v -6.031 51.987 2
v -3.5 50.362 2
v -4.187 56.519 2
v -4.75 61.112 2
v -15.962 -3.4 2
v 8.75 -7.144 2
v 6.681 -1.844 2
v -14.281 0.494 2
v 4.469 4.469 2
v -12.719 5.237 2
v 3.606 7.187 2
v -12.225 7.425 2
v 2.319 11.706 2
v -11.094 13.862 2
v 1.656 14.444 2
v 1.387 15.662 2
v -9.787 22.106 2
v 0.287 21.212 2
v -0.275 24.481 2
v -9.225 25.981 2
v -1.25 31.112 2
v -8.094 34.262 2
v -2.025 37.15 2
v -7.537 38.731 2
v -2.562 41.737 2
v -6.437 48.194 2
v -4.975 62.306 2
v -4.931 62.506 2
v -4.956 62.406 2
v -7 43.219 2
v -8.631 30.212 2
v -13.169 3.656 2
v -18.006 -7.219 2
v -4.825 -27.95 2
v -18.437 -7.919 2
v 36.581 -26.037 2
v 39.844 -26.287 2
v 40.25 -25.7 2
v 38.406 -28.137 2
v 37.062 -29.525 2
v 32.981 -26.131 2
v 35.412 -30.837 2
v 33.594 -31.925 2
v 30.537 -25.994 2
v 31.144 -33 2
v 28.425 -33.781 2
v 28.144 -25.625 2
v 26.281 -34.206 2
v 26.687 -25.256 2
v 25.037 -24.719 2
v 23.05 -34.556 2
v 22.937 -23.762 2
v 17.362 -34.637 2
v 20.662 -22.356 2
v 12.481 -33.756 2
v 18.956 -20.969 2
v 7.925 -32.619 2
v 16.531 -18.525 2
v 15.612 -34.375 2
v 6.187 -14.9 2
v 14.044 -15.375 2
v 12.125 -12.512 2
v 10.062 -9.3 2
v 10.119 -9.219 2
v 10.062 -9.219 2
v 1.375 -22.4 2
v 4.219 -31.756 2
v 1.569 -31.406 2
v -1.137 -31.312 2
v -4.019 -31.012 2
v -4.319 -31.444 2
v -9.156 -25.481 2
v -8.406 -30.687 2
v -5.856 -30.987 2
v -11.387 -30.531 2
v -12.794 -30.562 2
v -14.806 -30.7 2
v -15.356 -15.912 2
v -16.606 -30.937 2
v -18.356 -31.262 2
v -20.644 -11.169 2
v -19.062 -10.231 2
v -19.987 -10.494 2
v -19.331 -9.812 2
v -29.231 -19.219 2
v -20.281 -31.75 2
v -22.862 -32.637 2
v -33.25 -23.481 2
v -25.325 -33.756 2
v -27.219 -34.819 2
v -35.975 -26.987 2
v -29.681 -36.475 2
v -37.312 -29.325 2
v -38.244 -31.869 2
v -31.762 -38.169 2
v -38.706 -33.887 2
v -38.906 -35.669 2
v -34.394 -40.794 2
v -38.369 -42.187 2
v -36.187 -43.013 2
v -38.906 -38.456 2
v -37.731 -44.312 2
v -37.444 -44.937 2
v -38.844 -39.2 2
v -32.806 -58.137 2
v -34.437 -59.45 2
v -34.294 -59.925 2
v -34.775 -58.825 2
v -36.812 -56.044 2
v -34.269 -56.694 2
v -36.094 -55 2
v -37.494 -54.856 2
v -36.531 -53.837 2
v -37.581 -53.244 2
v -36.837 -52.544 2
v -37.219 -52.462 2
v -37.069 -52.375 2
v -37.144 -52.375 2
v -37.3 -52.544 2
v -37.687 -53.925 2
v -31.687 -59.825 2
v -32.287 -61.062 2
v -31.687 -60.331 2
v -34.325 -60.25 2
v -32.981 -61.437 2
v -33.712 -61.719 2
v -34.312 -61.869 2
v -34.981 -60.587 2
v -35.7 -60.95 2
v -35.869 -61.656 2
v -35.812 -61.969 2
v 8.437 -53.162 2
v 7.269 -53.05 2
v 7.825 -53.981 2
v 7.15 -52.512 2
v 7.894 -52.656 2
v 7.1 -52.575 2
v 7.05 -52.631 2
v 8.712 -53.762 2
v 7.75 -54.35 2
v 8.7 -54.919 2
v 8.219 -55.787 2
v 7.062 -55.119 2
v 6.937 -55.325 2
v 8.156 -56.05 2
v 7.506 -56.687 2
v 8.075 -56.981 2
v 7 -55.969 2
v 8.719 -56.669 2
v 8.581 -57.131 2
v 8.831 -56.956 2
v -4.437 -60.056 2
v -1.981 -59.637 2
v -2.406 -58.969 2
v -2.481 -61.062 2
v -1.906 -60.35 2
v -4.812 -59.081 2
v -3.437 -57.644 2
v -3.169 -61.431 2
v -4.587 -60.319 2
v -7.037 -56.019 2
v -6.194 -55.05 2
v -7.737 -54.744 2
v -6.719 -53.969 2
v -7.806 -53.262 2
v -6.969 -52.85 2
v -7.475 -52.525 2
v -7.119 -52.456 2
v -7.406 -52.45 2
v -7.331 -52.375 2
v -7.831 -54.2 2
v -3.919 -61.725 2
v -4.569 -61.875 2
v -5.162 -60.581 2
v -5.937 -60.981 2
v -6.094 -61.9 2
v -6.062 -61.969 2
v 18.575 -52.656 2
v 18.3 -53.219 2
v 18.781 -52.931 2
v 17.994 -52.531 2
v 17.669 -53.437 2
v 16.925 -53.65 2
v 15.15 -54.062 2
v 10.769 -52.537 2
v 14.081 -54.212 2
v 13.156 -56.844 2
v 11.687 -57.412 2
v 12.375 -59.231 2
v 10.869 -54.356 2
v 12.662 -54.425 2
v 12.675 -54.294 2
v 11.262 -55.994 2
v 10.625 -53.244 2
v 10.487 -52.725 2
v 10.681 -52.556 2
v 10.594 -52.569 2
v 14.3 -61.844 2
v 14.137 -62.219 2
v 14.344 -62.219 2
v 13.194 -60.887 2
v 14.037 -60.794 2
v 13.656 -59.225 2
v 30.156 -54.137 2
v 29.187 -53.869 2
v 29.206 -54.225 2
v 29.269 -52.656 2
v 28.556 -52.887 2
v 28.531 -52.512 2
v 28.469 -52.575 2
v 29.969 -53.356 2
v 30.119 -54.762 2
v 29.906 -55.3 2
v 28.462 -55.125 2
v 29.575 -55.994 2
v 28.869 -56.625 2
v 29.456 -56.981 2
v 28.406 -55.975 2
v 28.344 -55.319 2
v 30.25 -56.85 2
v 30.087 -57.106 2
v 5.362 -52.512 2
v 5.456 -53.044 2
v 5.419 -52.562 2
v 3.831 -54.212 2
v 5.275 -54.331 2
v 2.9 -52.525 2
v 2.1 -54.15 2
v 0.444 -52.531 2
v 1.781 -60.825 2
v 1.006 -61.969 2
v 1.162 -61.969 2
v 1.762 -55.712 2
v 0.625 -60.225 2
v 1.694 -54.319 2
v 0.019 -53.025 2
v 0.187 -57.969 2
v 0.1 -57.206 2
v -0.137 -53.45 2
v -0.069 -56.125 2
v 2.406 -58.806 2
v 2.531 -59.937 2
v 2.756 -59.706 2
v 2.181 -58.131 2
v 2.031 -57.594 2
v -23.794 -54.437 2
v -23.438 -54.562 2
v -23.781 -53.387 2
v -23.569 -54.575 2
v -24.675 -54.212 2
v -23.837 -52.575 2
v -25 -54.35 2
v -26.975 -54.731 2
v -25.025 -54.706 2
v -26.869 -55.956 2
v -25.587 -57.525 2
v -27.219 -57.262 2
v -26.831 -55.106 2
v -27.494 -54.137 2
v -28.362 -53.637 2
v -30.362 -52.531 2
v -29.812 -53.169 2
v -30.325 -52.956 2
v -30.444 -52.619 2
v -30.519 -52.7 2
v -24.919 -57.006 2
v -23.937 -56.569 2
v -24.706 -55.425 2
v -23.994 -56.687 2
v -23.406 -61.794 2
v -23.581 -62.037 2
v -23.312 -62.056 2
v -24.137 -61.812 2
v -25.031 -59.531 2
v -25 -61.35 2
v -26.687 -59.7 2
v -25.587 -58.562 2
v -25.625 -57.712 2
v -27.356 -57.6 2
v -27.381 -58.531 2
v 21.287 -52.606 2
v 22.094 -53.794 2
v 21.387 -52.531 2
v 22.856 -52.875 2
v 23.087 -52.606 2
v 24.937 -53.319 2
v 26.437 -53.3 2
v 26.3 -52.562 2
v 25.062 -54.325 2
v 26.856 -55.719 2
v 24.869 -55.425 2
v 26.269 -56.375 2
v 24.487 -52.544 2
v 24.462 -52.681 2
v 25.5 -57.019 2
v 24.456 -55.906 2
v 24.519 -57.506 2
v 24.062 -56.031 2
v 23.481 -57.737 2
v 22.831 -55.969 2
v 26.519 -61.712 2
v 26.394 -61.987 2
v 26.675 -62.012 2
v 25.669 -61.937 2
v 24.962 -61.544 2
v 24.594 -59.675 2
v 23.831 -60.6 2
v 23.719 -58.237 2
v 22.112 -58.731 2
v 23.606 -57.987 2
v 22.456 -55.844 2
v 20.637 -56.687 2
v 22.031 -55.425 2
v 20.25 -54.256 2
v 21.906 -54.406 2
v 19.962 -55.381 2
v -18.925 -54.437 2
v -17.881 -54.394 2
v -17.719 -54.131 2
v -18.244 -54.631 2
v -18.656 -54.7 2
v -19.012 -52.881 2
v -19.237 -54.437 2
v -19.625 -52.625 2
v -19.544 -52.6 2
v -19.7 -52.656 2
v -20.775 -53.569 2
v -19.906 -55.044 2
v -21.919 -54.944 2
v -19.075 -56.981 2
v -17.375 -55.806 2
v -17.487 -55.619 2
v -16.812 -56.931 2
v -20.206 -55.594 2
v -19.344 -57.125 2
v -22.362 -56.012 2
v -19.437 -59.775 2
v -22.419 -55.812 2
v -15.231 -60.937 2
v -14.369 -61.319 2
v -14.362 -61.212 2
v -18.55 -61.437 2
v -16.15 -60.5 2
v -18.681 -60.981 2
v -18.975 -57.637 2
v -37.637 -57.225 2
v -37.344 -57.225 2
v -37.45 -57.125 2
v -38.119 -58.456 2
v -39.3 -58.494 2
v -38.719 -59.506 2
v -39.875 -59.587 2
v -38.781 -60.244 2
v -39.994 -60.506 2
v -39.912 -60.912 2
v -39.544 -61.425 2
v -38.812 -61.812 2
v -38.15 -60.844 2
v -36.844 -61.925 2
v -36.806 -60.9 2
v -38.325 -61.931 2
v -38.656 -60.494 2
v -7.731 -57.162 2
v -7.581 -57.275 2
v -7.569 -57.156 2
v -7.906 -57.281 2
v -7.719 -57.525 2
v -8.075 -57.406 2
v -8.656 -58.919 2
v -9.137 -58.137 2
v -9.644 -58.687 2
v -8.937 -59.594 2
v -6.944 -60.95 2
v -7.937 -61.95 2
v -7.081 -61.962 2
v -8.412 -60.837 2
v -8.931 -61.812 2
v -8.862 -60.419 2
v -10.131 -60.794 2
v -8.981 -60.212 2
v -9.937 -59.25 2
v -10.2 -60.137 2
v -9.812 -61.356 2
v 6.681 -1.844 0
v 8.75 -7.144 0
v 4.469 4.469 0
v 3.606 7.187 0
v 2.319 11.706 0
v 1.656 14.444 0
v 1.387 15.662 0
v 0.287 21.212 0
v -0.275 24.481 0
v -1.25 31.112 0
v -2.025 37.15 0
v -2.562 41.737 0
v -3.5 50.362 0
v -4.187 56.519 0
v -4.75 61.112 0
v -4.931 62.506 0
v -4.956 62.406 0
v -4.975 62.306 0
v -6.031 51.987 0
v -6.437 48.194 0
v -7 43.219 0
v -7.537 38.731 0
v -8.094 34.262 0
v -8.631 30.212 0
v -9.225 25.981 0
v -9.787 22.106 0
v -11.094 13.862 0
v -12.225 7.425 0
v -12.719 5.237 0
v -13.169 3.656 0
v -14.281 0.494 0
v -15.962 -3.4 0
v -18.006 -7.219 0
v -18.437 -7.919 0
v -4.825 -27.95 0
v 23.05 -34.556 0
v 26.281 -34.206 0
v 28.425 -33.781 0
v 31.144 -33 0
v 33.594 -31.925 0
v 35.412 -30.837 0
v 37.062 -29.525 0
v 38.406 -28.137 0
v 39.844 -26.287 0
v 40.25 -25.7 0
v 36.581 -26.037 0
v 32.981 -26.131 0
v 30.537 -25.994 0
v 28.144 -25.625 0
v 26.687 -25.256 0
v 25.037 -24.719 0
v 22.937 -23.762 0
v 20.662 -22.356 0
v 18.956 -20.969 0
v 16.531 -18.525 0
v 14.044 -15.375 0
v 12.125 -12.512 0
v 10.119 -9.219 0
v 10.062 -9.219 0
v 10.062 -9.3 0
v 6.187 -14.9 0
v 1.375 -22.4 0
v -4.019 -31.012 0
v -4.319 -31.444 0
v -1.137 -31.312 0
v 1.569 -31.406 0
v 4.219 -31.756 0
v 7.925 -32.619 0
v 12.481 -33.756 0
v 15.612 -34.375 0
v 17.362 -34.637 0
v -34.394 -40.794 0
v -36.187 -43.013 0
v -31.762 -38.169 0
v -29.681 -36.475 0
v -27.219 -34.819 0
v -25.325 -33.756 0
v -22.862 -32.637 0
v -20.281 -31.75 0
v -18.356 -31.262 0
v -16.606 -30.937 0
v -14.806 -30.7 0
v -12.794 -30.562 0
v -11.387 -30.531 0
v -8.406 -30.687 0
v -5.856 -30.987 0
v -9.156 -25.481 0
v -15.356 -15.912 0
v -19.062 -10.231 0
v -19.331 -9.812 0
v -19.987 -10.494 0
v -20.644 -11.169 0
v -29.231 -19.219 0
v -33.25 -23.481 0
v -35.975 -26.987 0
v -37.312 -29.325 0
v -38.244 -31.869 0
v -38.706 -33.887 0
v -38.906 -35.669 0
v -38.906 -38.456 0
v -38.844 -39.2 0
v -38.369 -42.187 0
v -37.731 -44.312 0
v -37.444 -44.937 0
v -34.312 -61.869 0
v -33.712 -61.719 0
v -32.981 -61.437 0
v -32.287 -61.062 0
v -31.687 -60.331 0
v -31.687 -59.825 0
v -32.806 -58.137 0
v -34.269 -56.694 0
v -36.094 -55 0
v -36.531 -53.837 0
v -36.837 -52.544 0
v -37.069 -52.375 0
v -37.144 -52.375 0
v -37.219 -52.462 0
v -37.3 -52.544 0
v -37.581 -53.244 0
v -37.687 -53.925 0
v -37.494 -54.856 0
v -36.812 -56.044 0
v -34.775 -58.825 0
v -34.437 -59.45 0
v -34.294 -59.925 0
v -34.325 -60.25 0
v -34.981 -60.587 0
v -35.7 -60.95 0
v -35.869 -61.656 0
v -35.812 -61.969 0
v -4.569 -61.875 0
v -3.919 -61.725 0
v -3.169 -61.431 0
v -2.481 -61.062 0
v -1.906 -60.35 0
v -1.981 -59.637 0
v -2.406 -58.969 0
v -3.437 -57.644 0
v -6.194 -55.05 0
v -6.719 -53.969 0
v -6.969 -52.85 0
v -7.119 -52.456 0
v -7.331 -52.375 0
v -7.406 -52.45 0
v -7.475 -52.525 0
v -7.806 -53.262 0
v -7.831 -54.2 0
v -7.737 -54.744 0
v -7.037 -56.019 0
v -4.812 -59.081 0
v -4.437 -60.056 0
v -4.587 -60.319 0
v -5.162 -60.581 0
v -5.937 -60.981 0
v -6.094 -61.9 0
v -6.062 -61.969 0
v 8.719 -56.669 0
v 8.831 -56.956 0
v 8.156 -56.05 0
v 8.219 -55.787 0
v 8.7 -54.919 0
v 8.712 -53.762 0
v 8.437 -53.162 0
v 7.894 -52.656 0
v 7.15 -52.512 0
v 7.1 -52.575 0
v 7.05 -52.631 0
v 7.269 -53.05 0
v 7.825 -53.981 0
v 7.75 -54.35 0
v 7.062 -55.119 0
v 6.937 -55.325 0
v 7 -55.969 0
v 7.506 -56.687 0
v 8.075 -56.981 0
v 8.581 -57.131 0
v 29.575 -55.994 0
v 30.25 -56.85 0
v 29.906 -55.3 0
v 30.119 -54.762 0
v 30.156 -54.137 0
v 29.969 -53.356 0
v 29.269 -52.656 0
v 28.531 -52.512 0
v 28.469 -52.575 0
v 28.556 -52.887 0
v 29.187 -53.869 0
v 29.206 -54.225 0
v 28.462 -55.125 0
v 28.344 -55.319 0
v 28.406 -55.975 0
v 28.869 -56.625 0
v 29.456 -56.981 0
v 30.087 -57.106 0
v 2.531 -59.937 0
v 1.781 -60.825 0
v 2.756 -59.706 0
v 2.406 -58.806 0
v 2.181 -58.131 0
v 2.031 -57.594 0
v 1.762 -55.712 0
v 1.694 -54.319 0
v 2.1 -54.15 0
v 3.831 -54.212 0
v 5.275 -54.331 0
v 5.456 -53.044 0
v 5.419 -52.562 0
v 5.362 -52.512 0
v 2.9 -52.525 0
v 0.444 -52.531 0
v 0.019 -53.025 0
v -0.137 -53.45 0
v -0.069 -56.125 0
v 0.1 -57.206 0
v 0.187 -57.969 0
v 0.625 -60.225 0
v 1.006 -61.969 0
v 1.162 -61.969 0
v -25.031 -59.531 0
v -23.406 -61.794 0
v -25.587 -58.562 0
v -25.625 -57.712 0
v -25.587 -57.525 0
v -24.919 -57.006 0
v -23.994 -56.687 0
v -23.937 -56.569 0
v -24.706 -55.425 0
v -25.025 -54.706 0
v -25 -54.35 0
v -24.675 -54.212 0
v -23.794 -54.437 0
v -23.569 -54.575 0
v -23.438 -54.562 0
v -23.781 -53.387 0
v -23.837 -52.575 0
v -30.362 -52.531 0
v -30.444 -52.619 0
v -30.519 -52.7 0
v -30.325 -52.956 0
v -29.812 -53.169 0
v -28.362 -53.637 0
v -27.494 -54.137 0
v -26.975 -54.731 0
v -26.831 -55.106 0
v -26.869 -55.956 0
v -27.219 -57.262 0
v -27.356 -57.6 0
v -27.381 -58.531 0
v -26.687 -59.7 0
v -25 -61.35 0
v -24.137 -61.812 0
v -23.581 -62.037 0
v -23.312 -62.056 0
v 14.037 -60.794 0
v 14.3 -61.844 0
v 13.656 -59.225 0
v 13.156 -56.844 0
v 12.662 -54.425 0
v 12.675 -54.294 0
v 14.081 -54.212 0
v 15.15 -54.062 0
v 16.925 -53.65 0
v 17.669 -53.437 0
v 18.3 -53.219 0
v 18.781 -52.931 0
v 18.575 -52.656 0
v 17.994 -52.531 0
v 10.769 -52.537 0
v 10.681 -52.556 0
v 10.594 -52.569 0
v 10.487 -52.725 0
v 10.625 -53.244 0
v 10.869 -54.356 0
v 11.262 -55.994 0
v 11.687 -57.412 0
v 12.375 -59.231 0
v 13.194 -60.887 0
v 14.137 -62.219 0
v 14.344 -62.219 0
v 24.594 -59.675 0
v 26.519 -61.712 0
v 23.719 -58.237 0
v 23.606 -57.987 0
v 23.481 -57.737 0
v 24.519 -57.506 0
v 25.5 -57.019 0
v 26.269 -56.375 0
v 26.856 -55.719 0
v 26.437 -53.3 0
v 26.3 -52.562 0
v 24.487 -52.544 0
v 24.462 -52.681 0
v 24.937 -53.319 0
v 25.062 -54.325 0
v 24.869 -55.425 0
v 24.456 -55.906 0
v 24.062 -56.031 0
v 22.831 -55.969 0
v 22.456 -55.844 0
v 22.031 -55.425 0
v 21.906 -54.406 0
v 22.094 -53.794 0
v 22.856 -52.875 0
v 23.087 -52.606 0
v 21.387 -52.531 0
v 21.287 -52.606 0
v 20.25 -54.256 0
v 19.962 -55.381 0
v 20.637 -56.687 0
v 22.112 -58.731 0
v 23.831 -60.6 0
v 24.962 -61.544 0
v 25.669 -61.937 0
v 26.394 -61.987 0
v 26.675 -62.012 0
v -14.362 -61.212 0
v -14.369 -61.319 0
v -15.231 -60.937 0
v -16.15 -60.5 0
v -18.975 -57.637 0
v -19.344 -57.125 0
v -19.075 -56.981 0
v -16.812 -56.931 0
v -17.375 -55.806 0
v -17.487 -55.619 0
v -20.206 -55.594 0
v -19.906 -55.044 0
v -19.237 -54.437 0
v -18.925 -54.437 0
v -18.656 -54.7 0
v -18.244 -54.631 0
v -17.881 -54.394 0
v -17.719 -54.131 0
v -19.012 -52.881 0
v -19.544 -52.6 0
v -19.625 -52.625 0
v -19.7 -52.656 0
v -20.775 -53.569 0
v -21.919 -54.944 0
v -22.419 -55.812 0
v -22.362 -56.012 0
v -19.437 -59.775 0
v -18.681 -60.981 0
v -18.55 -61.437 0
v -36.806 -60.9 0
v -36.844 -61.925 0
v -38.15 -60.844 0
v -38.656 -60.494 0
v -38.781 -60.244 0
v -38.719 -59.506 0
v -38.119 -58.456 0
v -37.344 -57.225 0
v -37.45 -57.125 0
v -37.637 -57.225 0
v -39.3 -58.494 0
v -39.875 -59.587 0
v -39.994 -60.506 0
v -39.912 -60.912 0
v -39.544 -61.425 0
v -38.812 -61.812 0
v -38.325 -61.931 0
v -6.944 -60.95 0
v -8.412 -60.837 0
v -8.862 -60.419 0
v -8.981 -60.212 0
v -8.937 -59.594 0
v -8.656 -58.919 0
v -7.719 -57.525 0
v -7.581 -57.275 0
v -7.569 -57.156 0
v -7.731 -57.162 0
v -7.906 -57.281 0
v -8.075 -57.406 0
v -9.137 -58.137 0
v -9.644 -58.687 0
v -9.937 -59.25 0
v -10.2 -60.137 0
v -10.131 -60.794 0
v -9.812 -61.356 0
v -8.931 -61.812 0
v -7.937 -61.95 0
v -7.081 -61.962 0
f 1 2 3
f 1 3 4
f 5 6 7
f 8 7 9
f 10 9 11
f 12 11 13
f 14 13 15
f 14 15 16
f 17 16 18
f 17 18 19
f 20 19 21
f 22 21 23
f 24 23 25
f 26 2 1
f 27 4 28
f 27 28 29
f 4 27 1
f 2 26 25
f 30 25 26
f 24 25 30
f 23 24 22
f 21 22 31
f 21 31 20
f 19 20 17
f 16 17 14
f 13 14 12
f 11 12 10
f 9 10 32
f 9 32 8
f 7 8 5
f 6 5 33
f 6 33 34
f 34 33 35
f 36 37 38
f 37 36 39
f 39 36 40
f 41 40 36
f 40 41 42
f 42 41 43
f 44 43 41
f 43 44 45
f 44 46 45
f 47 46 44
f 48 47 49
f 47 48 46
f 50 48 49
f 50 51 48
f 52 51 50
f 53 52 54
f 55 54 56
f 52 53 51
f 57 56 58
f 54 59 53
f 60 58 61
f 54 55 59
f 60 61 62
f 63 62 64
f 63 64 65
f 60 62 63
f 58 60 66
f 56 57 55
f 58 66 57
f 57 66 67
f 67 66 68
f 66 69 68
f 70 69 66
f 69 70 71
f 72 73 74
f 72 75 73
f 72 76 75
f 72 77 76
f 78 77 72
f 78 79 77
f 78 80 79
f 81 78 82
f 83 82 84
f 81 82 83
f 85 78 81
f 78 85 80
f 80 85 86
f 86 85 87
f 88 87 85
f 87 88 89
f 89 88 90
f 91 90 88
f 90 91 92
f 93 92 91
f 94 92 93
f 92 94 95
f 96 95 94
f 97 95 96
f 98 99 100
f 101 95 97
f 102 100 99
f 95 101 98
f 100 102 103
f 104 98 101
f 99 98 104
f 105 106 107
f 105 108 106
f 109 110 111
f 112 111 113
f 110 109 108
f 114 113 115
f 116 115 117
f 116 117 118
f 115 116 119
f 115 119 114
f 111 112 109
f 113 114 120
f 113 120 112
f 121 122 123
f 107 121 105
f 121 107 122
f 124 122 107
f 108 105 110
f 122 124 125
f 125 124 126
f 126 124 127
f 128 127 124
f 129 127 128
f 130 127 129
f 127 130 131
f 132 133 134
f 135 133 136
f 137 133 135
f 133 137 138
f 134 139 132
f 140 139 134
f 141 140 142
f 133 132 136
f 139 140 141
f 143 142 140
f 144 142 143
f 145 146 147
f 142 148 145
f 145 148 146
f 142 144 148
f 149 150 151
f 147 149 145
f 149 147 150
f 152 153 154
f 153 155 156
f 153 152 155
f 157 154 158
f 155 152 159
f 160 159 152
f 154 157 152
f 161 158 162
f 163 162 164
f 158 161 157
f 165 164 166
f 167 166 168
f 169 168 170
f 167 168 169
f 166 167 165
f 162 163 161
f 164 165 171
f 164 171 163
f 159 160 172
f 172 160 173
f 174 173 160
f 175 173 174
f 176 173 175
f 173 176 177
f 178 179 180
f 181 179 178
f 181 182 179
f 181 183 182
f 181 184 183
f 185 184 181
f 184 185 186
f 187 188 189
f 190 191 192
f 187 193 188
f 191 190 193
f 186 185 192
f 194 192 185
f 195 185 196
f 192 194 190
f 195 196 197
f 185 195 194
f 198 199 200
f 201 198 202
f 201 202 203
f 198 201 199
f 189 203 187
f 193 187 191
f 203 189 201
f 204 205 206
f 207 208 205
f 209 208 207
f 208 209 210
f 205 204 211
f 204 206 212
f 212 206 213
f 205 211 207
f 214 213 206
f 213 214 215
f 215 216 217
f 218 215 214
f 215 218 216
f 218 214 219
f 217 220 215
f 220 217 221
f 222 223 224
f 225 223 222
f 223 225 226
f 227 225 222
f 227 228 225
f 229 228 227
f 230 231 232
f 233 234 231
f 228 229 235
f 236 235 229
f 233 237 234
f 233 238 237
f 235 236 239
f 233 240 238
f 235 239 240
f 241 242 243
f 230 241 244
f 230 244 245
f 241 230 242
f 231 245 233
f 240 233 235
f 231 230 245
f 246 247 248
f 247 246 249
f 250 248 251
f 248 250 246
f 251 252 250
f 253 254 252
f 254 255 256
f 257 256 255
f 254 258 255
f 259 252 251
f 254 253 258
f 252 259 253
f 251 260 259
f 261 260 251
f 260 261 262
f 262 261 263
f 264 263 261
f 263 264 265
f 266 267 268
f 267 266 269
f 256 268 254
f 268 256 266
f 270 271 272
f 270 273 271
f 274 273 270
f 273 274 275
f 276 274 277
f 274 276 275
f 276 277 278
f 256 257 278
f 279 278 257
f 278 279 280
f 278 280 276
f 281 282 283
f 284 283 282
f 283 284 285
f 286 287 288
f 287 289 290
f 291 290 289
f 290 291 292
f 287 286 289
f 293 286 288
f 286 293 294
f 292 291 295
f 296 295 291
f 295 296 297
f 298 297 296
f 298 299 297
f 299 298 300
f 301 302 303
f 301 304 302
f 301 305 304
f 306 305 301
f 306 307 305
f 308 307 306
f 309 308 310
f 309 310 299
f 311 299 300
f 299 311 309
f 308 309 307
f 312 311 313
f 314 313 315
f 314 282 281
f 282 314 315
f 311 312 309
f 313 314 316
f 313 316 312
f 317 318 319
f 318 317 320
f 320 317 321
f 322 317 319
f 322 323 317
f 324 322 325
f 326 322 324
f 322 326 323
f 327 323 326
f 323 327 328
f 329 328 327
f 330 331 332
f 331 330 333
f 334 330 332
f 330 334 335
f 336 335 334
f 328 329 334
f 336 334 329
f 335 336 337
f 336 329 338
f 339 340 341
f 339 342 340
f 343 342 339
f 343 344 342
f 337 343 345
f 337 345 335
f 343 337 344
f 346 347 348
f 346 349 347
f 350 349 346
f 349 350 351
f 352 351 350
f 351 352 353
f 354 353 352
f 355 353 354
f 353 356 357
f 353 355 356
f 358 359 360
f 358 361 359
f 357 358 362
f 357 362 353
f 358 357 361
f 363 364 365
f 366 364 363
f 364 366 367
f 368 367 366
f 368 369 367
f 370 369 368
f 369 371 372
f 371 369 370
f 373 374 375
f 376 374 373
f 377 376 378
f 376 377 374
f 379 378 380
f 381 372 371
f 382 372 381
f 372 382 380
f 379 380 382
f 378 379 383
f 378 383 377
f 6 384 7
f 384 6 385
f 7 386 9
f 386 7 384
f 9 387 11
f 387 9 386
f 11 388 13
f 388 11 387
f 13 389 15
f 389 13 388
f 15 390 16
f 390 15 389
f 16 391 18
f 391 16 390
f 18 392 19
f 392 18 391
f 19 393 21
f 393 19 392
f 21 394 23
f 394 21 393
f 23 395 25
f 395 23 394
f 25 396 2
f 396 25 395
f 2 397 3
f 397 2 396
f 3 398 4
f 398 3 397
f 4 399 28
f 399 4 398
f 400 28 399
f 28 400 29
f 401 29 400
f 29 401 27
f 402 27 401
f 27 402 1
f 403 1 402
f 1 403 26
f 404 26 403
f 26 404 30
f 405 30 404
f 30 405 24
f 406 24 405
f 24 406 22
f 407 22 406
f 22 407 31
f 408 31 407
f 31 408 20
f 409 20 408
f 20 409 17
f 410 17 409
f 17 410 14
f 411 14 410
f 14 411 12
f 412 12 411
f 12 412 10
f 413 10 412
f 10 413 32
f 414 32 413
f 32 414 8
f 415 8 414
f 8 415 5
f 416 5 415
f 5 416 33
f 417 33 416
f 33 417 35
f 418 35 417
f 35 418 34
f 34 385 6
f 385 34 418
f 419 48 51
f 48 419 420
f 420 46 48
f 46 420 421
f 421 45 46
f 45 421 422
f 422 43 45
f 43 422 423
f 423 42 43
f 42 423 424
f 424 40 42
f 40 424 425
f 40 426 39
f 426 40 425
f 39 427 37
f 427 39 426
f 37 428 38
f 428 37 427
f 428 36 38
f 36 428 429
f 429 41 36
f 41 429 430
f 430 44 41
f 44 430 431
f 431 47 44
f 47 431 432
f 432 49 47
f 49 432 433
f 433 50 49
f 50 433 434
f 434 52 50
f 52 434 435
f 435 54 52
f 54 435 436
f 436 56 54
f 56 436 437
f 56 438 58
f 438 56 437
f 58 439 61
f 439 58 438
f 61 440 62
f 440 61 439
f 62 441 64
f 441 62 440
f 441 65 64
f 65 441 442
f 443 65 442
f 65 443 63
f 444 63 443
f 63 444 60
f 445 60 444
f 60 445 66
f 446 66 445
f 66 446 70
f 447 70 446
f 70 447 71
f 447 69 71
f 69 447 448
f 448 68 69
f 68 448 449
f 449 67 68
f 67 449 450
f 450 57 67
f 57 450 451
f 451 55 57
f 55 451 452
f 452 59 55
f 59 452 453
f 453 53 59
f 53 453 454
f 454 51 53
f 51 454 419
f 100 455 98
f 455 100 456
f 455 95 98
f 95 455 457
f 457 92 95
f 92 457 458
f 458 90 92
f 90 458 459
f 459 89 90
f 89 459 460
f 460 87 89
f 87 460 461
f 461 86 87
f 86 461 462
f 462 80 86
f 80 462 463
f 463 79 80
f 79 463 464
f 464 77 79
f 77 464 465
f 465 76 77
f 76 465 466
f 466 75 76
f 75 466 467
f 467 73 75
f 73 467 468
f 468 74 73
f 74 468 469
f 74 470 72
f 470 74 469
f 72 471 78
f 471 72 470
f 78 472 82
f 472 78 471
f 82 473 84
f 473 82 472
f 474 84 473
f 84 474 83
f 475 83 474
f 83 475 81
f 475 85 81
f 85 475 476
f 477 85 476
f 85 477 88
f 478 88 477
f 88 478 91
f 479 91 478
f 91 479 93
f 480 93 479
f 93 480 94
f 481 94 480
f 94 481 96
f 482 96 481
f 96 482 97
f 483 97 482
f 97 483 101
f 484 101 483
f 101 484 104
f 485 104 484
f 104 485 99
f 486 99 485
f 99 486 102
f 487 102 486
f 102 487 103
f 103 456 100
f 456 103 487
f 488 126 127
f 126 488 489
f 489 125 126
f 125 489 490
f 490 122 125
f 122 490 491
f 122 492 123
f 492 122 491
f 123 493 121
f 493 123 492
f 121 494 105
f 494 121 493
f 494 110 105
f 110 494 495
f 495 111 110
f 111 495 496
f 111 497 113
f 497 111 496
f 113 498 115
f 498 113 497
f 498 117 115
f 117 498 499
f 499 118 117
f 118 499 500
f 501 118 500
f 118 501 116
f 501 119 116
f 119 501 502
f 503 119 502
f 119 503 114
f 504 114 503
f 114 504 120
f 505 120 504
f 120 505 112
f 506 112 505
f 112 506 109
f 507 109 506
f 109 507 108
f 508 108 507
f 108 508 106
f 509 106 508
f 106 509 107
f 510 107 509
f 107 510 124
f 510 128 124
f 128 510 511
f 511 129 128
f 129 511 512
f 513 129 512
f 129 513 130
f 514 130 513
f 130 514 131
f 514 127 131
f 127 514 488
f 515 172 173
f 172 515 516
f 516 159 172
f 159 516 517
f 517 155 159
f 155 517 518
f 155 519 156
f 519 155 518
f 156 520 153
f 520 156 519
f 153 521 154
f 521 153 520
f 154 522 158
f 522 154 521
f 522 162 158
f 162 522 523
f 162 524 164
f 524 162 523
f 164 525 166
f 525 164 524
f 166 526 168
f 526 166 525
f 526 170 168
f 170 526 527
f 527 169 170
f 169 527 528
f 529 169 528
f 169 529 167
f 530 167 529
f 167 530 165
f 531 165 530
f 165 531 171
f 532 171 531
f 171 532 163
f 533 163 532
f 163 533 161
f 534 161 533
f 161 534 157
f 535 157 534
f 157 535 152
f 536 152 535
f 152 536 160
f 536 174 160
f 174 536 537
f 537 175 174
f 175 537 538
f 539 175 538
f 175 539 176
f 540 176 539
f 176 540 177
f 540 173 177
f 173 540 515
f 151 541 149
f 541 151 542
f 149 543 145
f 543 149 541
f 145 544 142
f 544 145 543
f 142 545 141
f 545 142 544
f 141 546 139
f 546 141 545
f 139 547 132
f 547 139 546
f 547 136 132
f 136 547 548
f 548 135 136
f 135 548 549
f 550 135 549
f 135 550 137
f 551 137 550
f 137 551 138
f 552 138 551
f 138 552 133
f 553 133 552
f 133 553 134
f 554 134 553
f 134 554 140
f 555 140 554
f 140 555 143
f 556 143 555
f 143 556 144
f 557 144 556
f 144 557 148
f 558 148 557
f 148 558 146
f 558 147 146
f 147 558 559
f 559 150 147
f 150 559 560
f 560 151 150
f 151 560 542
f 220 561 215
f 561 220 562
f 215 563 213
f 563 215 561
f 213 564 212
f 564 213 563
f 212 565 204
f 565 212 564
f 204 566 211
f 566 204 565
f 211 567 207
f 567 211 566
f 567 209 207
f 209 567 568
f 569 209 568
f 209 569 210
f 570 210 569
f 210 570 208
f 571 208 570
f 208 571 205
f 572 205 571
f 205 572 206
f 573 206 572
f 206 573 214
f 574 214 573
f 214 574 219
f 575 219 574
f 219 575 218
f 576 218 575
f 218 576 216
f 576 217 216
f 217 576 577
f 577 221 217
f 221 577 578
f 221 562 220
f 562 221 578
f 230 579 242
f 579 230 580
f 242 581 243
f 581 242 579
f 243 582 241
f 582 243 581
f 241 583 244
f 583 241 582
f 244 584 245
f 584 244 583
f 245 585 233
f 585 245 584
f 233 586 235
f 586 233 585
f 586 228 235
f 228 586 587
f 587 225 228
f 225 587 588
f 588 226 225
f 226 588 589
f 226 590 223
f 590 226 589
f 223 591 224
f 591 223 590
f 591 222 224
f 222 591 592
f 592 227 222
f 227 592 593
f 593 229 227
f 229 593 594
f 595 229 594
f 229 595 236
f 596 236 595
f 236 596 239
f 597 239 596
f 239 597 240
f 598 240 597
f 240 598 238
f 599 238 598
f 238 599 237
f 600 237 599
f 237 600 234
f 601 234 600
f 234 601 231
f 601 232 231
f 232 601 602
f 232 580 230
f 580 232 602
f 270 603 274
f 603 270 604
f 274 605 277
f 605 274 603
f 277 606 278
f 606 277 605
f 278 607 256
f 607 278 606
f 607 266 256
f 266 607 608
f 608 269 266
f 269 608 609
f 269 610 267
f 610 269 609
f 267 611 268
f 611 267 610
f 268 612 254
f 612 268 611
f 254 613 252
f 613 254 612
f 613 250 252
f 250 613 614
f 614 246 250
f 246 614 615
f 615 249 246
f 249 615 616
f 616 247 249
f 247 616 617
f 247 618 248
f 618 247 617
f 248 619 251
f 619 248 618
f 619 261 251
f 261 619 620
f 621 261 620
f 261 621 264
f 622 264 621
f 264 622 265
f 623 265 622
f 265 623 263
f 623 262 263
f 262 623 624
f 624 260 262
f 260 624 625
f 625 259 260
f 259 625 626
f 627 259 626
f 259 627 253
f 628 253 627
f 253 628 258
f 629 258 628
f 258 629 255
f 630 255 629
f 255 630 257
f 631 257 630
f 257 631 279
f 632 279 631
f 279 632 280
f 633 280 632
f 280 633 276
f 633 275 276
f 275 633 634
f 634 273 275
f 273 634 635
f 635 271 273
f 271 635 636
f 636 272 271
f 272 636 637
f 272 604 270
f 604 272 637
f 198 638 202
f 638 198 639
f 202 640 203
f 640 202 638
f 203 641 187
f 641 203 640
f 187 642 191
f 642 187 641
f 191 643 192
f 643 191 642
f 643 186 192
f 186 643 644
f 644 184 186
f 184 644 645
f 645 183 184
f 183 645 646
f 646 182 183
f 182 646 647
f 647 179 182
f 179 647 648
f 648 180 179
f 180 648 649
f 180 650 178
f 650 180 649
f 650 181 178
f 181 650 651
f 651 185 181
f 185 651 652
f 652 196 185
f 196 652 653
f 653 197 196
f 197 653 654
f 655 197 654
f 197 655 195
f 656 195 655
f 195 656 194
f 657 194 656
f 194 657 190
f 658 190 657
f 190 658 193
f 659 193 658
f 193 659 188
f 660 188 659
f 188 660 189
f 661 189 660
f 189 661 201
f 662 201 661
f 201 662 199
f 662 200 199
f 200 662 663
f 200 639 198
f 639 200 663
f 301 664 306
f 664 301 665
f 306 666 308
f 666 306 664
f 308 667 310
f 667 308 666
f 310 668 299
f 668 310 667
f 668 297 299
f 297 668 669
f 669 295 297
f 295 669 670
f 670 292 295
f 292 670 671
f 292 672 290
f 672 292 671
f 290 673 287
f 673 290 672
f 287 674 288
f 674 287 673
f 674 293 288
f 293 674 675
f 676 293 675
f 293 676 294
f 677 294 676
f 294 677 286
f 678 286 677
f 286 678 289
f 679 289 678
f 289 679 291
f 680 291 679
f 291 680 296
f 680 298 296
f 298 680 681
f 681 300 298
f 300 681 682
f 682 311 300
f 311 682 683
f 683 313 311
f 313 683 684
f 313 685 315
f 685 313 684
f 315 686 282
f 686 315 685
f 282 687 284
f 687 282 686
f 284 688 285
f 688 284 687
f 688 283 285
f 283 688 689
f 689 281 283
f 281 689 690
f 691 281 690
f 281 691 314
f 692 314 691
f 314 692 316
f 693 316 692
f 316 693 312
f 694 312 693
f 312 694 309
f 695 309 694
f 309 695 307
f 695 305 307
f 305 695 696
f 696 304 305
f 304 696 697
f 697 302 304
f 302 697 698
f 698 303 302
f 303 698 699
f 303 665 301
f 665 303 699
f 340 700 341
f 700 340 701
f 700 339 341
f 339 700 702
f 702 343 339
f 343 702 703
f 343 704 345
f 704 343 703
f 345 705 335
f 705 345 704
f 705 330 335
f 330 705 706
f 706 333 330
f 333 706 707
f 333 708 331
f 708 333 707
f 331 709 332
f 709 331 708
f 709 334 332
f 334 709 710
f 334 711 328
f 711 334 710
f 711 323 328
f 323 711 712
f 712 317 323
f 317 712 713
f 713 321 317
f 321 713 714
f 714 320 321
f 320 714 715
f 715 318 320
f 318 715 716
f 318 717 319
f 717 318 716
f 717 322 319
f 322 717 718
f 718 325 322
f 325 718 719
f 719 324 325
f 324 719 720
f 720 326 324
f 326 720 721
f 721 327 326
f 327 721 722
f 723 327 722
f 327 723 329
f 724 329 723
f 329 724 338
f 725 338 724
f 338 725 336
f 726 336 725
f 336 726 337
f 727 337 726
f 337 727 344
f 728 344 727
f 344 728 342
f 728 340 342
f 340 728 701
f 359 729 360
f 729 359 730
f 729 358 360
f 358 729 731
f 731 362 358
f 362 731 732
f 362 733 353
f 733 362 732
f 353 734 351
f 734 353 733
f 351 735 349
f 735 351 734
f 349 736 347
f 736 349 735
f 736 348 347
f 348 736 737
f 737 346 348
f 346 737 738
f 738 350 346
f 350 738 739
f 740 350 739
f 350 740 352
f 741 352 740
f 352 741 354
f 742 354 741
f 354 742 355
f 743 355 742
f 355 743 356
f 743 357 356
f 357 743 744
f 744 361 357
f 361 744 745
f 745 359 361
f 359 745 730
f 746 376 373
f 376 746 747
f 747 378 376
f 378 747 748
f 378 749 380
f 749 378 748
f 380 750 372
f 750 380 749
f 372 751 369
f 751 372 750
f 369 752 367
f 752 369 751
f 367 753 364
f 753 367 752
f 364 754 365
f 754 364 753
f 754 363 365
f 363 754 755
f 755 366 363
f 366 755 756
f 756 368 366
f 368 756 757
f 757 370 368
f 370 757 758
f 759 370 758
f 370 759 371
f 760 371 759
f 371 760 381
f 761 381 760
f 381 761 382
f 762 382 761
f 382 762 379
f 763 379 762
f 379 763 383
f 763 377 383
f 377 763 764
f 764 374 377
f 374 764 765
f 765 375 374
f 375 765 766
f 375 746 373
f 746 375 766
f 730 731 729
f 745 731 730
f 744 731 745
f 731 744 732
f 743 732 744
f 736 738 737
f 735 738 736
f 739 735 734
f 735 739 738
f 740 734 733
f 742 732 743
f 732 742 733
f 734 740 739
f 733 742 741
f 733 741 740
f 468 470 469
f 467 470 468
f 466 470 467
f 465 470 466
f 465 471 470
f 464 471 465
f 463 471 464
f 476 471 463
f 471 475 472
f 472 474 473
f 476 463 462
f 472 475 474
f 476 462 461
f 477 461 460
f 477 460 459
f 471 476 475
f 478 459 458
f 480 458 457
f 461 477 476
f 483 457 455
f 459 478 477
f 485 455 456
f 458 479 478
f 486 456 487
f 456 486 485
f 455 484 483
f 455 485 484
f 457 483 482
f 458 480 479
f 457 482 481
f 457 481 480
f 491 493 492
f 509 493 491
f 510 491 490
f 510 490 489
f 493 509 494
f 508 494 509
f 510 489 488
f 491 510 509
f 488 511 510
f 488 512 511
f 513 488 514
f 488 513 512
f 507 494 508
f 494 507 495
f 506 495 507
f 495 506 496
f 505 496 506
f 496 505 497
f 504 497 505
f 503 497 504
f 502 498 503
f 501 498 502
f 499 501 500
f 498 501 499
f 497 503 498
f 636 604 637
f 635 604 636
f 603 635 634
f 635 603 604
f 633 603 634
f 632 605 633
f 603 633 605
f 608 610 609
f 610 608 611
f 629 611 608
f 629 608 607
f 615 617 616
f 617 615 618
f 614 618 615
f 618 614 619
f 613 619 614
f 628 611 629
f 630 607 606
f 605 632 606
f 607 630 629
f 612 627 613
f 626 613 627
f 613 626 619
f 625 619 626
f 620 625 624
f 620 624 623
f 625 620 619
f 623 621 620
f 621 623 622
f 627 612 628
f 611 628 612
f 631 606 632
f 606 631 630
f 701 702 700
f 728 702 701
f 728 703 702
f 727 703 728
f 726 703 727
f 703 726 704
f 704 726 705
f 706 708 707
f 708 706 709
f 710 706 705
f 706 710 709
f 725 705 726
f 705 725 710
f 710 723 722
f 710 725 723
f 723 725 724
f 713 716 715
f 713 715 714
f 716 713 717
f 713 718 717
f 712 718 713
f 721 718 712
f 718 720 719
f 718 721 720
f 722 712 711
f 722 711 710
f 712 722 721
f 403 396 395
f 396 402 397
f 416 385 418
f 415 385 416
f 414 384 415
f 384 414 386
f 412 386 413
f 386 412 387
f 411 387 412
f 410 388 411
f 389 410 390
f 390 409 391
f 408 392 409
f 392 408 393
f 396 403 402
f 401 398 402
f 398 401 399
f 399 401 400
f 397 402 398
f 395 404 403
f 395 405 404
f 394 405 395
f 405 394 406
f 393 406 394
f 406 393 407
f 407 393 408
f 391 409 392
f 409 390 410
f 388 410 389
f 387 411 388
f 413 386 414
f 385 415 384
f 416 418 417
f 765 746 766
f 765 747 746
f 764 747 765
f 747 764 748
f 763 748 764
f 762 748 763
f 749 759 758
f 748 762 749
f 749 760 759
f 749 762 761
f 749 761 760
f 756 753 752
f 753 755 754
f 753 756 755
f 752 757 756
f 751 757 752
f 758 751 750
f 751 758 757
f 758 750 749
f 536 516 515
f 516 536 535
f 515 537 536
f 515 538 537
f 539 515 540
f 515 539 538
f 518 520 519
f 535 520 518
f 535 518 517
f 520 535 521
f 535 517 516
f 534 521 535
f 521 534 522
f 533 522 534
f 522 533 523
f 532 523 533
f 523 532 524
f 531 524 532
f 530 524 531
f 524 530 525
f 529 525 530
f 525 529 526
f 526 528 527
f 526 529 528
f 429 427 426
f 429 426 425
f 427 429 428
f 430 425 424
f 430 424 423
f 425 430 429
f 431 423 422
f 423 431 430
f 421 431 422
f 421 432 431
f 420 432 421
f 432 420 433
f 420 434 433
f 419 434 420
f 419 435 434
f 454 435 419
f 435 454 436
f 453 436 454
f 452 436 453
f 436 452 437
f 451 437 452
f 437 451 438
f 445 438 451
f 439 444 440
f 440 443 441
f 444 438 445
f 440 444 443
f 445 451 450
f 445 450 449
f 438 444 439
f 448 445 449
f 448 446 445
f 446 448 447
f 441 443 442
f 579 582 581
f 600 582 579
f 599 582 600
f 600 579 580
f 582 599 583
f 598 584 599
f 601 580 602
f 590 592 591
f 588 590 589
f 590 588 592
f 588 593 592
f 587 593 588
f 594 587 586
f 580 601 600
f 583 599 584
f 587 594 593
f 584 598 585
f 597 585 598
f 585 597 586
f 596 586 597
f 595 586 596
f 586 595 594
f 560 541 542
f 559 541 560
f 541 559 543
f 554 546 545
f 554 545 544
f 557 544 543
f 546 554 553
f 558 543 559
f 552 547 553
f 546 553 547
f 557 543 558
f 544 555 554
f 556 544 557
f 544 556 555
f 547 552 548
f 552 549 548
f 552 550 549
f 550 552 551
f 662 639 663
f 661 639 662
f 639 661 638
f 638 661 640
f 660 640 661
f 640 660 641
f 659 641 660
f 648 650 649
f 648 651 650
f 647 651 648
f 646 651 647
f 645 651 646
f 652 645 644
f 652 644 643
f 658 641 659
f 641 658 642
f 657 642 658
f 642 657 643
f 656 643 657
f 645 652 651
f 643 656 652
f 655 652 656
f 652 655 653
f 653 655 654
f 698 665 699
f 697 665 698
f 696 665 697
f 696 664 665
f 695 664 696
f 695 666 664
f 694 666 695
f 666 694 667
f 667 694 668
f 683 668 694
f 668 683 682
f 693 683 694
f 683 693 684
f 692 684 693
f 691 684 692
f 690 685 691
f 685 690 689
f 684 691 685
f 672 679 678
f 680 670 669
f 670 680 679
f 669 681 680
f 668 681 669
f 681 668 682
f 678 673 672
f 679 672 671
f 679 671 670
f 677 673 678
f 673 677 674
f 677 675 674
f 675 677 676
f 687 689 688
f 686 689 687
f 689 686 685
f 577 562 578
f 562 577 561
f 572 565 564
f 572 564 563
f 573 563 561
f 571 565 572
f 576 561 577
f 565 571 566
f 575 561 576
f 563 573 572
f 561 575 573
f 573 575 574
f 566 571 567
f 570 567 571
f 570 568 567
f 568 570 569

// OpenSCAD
module d4747ef8d78aa88752bc6e39e81ac5de_1()
{
 /* Generated by trace2scad version 20150415
    http://aggregate.org/MAKE/TRACE2SCAD/
    Optimized model has 387/4796 original points
 */
 color([0.48, 0.48, 0.48])
 assign(minx=0) /* polygon minx=39 */
 assign(miny=0) /* polygon miny=45 */
 assign(maxx=12880) /* polygon maxx=12880 */
 assign(maxy=20000) /* polygon maxy=20001 */
 assign(dx=maxx-minx)
 assign(dy=maxy-miny)
 assign(maxd=((dx>dy)?dx:dy))
 scale([1/maxd, 1/maxd, 1])
 translate([-minx-dx/2, -miny-dy/2, 0])
 linear_extrude(height=1, convexity=387)
 union() {
  union() {
   polygon([[5647,19985],[5644,19969],[5475,18318],[5410,17711],[5320,16915],[5234,16197],[5145,15482],[5059,14834],[4964,14157],[4874,13537],[4665,12218],[4484,11188],[4405,10838],[4333,10585],[4155,10079],[3886,9456],[3559,8845],[3490,8733],[5668,5528],[7840,8857],[7509,9705],[7155,10715],[7017,11150],[6811,11873],[6705,12311],[6662,12506],[6486,13394],[6396,13917],[6240,14978],[6116,15944],[6030,16678],[5880,18058],[5770,19043],[5680,19778],[5651,20001]], convexity=6);
   polygon([[8050,8518],[8050,8512],[7430,7616],[6660,6416],[5797,5038],[5749,4969],[6258,4990],[6691,4975],[7115,4919],[7708,4781],[8437,4599],[8938,4500],[9218,4458],[10128,4471],[10645,4527],[10988,4595],[11423,4720],[11815,4892],[12106,5066],[12370,5276],[12585,5498],[12815,5794],[12880,5888],[12293,5834],[11717,5819],[11326,5841],[10943,5900],[10710,5959],[10446,6045],[10110,6198],[9746,6423],[9473,6645],[9085,7036],[8687,7540],[8380,7998],[8059,8525],[8050,8525]], convexity=9);
   polygon([[3242,8321],[3137,8213],[1763,6925],[1120,6243],[684,5682],[470,5308],[321,4901],[247,4578],[215,4293],[215,3847],[225,3728],[301,3250],[403,2910],[449,2810],[650,3118],[937,3473],[1358,3893],[1691,4164],[2085,4429],[2388,4599],[2782,4778],[3195,4920],[3503,4998],[3783,5050],[4071,5088],[4393,5110],[4618,5115],[5095,5090],[5503,5042],[4975,5923],[3983,7454],[3390,8363],[3347,8430]], convexity=7);
   polygon([[485,1606],[472,1593],[427,1481],[410,1372],[441,1223],[550,1033],[876,588],[930,488],[953,412],[948,360],[843,306],[728,248],[701,135],[710,85],[950,101],[1046,125],[1163,170],[1274,230],[1370,347],[1370,428],[1191,698],[957,929],[665,1200],[595,1386],[546,1593],[509,1620],[497,1620]], convexity=8);
   polygon([[5255,1608],[5244,1596],[5191,1478],[5187,1328],[5202,1241],[5314,1037],[5670,547],[5730,391],[5706,349],[5614,307],[5490,243],[5465,96],[5470,85],[5709,100],[5813,124],[5933,171],[6043,230],[6135,344],[6123,458],[6055,565],[5890,777],[5449,1192],[5365,1365],[5325,1544],[5301,1607],[5267,1620]], convexity=8);
   polygon([[6904,1596],[6511,1595],[6443,1516],[6418,1448],[6429,1020],[6456,847],[6470,725],[6540,364],[6601,85],[6626,85],[6725,268],[6845,410],[6881,447],[6825,591],[6789,699],[6765,785],[6722,1086],[6711,1309],[6776,1336],[7053,1326],[7284,1307],[7313,1513],[7307,1590],[7298,1598]], convexity=10);
   polygon([[7576,1588],[7568,1579],[7603,1512],[7692,1363],[7680,1304],[7570,1181],[7550,1148],[7560,1045],[7641,930],[7732,883],[7813,859],[7853,887],[7835,933],[7745,1032],[7755,1074],[7832,1213],[7834,1398],[7790,1494],[7703,1575],[7584,1598]], convexity=10);
   polygon([[11000,1593],[10995,1588],[11009,1538],[11110,1381],[11113,1324],[10994,1180],[10975,1149],[10985,1044],[11059,940],[11153,883],[11254,863],[11280,904],[11172,1041],[11225,1152],[11259,1238],[11265,1338],[11235,1463],[11123,1575],[11005,1598]], convexity=10);
   polygon([[1569,1581],[1557,1568],[1588,1527],[1670,1493],[1902,1418],[2041,1338],[2124,1243],[2147,1183],[2141,1047],[2085,838],[2063,784],[2059,635],[2170,448],[2440,184],[2578,110],[2667,74],[2710,71],[2695,113],[2435,475],[2346,630],[2340,766],[2346,796],[2453,879],[2601,930],[2610,949],[2487,1132],[2436,1247],[2440,1304],[2492,1326],[2633,1290],[2669,1268],[2690,1270],[2635,1458],[2626,1588],[1582,1595]], convexity=13);
   polygon([[8149,1591],[8135,1589],[8118,1564],[8140,1481],[8179,1303],[8242,1041],[8310,814],[8420,523],[8551,258],[8702,45],[8735,45],[8728,105],[8686,273],[8625,524],[8545,905],[8466,1292],[8468,1313],[8693,1326],[8864,1350],[9148,1416],[9267,1450],[9368,1485],[9445,1531],[9412,1575],[9319,1595],[8163,1594]], convexity=9);
   polygon([[9854,1589],[9846,1583],[9680,1319],[9634,1139],[9742,930],[9978,603],[10253,304],[10434,153],[10547,90],[10663,82],[10708,78],[10683,126],[10375,452],[10235,682],[10217,722],[10197,762],[10363,799],[10520,877],[10643,980],[10737,1085],[10670,1472],[10648,1590],[10358,1593],[10354,1571],[10430,1469],[10450,1308],[10419,1132],[10353,1055],[10290,1035],[10093,1045],[10033,1065],[9965,1132],[9945,1295],[9975,1393],[10097,1540],[10134,1583],[9862,1595]], convexity=13);
   polygon([[3300,1580],[3288,1575],[3116,1429],[2933,1209],[2853,1070],[2862,1038],[3330,436],[3451,243],[3472,170],[4141,189],[4142,206],[4003,250],[3856,320],[3404,778],[3345,860],[3388,883],[3750,891],[3660,1071],[3642,1101],[3207,1105],[3255,1193],[3362,1290],[3412,1290],[3455,1248],[3521,1259],[3579,1297],[3605,1339],[3398,1539],[3313,1584]], convexity=12);
   polygon([[433,852],[418,844],[152,641],[60,466],[41,319],[54,254],[113,172],[230,110],[308,91],[545,92],[551,256],[336,265],[255,321],[235,361],[245,479],[341,647],[465,844],[448,860]], convexity=8);
   polygon([[5175,835],[5148,815],[4978,698],[4897,610],[4850,520],[4808,378],[4819,273],[4870,183],[5011,110],[5170,88],[5307,86],[5329,248],[5094,266],[5022,333],[5003,366],[5010,465],[5055,573],[5205,796],[5227,836],[5229,855],[5203,854]], convexity=8);
  }
 }
}

module d4747ef8d78aa88752bc6e39e81ac5de()
{
 /* all layers combined, scaled to within a 1mm cube */
 scale([1, 1, 1/1])
 difference() {
  union() {
   scale([1,1,2]) translate([0,0,-0.5]) d4747ef8d78aa88752bc6e39e81ac5de_1();
  }
  translate([0,0,-2]) cube([2,2,4],center=true);
 }
}

scale([125, 125, 2]) {
	d4747ef8d78aa88752bc6e39e81ac5de();
}
